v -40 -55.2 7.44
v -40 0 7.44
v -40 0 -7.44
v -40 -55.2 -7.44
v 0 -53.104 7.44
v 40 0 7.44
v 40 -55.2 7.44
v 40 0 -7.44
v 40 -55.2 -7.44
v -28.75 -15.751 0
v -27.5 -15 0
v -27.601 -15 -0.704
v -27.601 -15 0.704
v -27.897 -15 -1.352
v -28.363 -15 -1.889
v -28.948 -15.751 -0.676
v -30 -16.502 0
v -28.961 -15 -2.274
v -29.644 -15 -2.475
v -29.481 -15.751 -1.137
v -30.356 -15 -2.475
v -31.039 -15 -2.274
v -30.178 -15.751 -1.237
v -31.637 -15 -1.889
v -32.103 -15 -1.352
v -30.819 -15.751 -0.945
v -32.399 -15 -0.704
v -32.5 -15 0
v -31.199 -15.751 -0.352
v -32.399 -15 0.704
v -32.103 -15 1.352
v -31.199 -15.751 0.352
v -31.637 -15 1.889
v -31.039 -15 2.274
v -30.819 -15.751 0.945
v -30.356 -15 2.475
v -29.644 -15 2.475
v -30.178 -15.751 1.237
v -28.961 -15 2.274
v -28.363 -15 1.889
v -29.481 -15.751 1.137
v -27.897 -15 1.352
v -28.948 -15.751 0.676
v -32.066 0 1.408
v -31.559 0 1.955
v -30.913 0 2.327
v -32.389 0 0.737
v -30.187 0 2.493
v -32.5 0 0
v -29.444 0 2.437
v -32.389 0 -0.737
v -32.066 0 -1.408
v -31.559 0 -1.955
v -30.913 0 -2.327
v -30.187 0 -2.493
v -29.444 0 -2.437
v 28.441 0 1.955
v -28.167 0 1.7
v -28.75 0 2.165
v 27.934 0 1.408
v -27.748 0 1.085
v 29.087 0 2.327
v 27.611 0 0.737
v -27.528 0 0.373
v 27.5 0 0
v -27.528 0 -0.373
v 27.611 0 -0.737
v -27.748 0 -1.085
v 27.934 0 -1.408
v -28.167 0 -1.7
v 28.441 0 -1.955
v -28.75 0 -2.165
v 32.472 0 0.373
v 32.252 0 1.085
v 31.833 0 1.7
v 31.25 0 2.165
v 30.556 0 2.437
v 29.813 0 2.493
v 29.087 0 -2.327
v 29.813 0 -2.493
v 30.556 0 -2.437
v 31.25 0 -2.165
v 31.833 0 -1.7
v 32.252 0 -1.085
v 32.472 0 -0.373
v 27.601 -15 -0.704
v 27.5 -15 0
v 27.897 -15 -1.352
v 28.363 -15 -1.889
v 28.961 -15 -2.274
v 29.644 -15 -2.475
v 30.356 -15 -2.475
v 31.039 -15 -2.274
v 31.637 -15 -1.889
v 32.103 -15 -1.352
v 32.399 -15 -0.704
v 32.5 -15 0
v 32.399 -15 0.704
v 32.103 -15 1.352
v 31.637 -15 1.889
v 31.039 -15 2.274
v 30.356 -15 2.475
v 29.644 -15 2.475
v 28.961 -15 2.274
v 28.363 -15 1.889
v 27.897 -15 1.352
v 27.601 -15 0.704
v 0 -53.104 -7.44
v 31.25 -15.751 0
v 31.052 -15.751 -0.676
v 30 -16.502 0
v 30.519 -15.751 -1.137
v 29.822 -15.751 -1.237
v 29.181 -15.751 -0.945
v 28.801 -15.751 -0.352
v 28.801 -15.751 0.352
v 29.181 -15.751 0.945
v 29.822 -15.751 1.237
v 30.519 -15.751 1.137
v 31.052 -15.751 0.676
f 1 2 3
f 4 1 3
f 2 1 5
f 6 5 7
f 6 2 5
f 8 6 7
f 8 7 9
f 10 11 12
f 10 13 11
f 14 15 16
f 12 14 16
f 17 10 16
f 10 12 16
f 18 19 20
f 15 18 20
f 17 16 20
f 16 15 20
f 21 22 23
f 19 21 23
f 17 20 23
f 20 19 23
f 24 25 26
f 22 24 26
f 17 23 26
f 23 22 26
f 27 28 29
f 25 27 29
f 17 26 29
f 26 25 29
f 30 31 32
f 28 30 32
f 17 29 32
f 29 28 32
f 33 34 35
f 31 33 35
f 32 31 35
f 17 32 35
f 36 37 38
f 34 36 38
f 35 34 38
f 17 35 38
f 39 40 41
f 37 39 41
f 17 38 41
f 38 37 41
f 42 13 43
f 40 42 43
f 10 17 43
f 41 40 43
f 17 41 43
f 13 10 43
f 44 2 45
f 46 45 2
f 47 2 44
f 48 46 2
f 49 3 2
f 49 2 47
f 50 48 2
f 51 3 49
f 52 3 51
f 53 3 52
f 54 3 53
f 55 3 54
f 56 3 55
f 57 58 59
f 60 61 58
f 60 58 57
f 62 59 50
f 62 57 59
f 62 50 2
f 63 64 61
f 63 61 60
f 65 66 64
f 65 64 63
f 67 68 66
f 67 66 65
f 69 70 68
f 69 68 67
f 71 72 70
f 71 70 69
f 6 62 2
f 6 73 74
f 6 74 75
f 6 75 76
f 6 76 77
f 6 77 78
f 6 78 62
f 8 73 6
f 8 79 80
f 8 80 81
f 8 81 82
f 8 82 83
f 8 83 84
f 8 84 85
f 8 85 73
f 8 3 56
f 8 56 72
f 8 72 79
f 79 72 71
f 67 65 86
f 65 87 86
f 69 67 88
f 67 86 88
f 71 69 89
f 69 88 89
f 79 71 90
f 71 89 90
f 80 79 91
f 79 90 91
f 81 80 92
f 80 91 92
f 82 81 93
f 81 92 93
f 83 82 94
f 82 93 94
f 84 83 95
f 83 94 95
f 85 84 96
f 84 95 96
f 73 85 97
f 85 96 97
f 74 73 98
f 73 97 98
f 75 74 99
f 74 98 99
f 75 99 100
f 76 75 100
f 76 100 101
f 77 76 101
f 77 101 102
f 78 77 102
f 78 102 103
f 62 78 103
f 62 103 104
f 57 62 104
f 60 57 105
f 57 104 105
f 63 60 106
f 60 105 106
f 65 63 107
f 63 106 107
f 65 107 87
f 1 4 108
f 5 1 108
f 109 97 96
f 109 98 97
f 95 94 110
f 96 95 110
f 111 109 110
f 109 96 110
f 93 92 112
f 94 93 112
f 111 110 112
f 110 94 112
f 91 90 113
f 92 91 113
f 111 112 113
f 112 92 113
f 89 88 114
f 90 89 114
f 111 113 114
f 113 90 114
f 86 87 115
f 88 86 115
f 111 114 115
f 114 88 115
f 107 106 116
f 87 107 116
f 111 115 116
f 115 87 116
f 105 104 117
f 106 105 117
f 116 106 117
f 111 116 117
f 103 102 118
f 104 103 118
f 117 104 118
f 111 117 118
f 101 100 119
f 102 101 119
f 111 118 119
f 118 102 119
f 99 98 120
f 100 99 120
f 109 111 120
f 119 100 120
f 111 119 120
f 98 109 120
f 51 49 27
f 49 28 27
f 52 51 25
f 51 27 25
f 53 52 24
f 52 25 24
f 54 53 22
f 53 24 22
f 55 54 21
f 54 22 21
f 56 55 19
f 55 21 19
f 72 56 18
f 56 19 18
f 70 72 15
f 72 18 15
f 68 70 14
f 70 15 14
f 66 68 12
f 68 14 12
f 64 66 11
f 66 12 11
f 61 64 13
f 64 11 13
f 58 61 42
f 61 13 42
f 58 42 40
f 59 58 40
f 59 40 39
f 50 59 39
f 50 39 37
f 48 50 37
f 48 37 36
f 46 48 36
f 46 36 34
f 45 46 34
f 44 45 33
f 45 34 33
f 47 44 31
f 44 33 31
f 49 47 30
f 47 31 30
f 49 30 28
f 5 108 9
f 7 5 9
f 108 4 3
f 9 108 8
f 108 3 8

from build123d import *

# Parameters (mm, degrees)
SKETCH1_W             = 80
SKETCH1_H             = 14.88
BOSS_EXTRUDE1_DEPTH   = 55.2
CUT_EXTRUDE1_DEPTH    = 70.774310459
M6_TAPPED_HOLE1_D     = 5
M6_TAPPED_HOLE1_DEPTH = 15
M6_TAPPED_HOLE1_TIP   = 1.502151548


with BuildPart() as part:
    # Sketch1 → Boss-Extrude1 (new body)
    with BuildSketch(Plane(origin=(0, 0, 0), x_dir=(1, 0, 0), z_dir=(0, 1, 0))):
        Rectangle(SKETCH1_W, SKETCH1_H)
    extrude(amount=-BOSS_EXTRUDE1_DEPTH)

    # Sketch3 → Cut-Extrude1 (cut, through all)
    with BuildSketch(Plane(origin=(0, 0, -7.44), x_dir=(-1, 0, 0), z_dir=(0, 0, -1))):
        Polygon((40, -55.2), (0, -53.103688829), (-40, -55.2), align=None)
    extrude(amount=-CUT_EXTRUDE1_DEPTH, mode=Mode.SUBTRACT)

    # M6 Tapped Hole1
    with Locations(Plane(origin=(0, 0, 0), x_dir=(1, 0, 0), z_dir=(0, 1, 0))):
        with Locations((-30, 0), (30, 0)):
            Hole(M6_TAPPED_HOLE1_D / 2, depth=M6_TAPPED_HOLE1_DEPTH)
            with Locations((0, 0, -(M6_TAPPED_HOLE1_DEPTH + M6_TAPPED_HOLE1_TIP / 2))):  # 118° drill point
                Cone(0, M6_TAPPED_HOLE1_D / 2, M6_TAPPED_HOLE1_TIP, mode=Mode.SUBTRACT)


solid = part.part
